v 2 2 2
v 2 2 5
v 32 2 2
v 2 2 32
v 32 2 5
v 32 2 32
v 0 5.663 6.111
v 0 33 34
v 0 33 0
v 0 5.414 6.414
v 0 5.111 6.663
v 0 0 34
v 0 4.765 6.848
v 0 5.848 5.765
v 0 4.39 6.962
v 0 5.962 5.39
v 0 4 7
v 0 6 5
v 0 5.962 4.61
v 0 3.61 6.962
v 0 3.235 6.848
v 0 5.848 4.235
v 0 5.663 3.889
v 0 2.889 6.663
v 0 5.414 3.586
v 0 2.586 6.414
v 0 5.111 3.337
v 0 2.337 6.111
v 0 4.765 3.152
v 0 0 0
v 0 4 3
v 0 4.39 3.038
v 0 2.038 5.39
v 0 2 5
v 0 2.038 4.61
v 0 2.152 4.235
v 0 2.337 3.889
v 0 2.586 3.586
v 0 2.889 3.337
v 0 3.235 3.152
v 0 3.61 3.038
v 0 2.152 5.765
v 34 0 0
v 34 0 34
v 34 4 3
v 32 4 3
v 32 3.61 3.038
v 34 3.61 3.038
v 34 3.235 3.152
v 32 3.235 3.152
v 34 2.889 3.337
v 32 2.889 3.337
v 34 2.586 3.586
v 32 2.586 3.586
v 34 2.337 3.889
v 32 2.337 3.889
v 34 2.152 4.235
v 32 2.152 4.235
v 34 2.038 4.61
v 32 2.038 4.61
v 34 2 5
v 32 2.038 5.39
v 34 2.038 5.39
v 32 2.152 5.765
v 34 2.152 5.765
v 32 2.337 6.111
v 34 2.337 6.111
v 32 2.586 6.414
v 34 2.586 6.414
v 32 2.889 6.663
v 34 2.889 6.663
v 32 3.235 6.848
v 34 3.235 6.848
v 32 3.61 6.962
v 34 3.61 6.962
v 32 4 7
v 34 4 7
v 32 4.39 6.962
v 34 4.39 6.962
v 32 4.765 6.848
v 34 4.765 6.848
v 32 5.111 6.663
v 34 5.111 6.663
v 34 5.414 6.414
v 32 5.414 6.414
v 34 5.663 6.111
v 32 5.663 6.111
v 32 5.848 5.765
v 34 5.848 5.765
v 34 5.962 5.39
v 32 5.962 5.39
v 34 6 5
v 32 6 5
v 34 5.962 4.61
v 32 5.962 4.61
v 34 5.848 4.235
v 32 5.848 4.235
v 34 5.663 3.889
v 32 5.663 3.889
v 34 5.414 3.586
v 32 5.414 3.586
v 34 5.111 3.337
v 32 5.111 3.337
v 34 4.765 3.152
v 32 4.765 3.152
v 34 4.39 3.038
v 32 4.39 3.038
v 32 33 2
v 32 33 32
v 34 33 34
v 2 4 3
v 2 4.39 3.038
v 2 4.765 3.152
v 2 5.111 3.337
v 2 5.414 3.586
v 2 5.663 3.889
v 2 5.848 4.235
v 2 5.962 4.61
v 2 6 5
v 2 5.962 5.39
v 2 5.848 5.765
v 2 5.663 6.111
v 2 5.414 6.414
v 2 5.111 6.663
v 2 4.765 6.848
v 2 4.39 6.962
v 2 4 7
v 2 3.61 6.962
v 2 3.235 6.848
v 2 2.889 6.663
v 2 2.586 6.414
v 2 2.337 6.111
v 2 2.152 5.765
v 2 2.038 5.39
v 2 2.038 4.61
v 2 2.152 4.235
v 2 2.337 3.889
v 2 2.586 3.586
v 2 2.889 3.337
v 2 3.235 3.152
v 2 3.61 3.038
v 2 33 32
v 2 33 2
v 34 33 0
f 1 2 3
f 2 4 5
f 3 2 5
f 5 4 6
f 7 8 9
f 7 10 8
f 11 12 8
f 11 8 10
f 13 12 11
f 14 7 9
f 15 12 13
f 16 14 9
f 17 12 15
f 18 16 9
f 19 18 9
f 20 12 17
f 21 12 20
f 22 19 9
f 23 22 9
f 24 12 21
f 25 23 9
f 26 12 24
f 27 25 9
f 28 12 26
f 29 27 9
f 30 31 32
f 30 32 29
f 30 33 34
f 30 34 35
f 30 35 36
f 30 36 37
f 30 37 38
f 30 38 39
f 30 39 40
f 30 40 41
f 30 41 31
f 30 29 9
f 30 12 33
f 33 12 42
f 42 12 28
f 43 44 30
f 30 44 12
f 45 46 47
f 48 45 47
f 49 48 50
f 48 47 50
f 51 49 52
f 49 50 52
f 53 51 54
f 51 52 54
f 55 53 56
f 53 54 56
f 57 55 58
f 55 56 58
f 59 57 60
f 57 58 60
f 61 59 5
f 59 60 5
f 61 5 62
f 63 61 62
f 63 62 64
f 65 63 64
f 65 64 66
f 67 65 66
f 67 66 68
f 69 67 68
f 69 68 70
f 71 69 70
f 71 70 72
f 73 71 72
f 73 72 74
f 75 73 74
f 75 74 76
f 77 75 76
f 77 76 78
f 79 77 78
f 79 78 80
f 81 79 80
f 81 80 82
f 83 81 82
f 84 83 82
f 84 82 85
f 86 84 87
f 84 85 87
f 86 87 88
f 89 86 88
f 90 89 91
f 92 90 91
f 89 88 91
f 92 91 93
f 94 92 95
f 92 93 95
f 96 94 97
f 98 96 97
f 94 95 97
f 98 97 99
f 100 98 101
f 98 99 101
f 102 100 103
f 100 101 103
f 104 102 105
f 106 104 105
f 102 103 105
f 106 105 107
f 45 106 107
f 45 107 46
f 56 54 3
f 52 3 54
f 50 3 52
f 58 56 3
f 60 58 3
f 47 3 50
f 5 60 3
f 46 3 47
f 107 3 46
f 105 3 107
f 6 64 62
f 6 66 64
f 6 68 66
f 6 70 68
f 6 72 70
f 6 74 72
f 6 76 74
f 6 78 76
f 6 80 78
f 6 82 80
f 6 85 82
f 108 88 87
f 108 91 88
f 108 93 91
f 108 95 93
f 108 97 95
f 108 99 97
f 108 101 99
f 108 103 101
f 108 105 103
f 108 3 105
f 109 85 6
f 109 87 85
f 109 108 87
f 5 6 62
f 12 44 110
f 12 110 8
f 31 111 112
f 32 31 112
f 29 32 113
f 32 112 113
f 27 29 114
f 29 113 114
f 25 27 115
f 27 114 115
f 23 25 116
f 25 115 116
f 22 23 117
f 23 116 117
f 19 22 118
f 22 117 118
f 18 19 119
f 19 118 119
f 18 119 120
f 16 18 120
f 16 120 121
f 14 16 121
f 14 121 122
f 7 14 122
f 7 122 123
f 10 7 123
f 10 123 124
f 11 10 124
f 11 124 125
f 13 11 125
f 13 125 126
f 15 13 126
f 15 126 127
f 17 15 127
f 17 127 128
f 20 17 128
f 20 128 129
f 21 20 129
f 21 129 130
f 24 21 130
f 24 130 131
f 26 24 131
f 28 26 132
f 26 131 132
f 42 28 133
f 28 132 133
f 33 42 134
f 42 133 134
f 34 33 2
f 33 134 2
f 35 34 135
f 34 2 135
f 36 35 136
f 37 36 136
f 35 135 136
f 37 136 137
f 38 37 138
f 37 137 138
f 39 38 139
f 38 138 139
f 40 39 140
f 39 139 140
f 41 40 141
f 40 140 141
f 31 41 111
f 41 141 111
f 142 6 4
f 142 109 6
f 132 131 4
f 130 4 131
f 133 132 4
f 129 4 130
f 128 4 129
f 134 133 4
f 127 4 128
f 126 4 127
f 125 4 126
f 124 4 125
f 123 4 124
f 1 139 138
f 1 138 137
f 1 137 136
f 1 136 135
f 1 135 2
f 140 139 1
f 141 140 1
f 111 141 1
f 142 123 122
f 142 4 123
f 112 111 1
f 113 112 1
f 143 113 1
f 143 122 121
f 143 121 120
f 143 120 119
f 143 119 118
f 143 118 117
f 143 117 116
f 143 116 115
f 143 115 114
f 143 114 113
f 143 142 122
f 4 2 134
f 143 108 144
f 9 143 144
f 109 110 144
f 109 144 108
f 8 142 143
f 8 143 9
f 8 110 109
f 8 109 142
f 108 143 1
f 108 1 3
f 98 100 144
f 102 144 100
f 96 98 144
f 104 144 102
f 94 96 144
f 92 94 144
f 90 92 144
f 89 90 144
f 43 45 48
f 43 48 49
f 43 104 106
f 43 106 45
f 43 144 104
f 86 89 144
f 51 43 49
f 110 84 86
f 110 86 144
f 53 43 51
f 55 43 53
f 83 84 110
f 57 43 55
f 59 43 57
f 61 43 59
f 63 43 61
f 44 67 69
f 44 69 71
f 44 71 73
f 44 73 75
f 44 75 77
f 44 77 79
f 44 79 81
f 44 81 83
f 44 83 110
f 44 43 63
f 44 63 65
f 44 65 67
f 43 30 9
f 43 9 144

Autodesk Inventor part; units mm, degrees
ref_plane "YZ Plane" through (0, 0, 0) normal (1, 0, 0) x (0, 1, 0)
ref_plane "XZ Plane" through (0, 0, 0) normal (0, 1, 0) x (-1, 0, 0)
ref_plane "XY Plane" through (0, 0, 0) normal (0, 0, 1) x (1, 0, 0)
sketch "Sketch1" plane through (0, 0, 0) normal (0, 1, 0) x (-1, 0, 0)
  line L0 (0, 0) -> (-34, 0)
  line L1 (-34, 0) -> (-34, 34)
  line L2 (-34, 34) -> (0, 34)
  line L3 (0, 34) -> (0, 0)
  dimension "d0" = 34
  dimension "d1" = 34
extrude "Extrusion1" add sketch "Sketch1" along normal blind 33
sketch "Sketch2" plane through (0, 33, 0) normal (0, 1, 0) x (1, 0, 0)
  line L0 (0, -34) -> (34, -34) projected
  line L1 (34, -34) -> (34, 0) projected
  line L2 (34, 0) -> (0, 0) projected
  line L3 (0, 0) -> (0, -34) projected
  line L4 (2, -2) -> (32, -2)
  line L5 (32, -2) -> (32, -32)
  line L6 (32, -32) -> (2, -32)
  line L7 (2, -32) -> (2, -2)
  dimension "d4" = 2
extrude "Extrusion2" cut sketch "Sketch2" against normal blind 36 contours L4 L5 L6 L7
sketch "Sketch3" plane through (34, 0, 34) normal (1, 0, 0) x (0, 0, -1)
  line L0 (0, 0) -> (34, 0) projected
  line L1 (0, 33) -> (34, 33) projected
  line L2 (2, 33) -> (32, 33) projected
  line L3 (34, 0) -> (34, 38) projected
  line L4 (34, 0) -> (29, 0)
  line L5 (0, 0) -> (34, 0) projected
  line L6 (29, 0) -> (29, 4)
  line L7 (34, 0) -> (34, 33) projected
  line L8 (0, 0) -> (0, 33) projected
  line L9 (32, 0) -> (2, 0) projected
  line L10 (32, 33) -> (32, 0) projected
  line L11 (2, 33) -> (2, 0) projected
  dimension "d7" = 5
  dimension "d8" = 4
hole "Hole1" at (34, 4, 5) direction (-1, 0, 0) diameter 4 depth 2
ref_plane "Work Plane1" through (17, 33, 32) normal (1, 0, 0) x (0, 0, -1)
mirror "Mirror1" about plane through (17, 33, 32) normal (1, 0, 0) of "Hole1"
sketch "Sketch6" plane through (0, 33, 0) normal (0, 1, 0) x (1, 0, 0)
  point P0 (0, 0)
sketch "Sketch7" plane through (0, 0, 0) normal (0, -1, 0) x (1, 0, 0)
  line L0 (34, 0) -> (0, 0) projected
  line L1 (0, 34) -> (34, 34) projected
  line L2 (34, 0) -> (0, 0)
  line L3 (0, 0) -> (0, 34)
  line L4 (0, 34) -> (34, 34)
  line L5 (34, 34) -> (34, 0)
extrude "Extrusion5" add sketch "Sketch7" against normal blind 2
equation "\"BendRadius\" = Thickness"
equation "\"BendReliefWidth\" = Thickness"
equation "\"BendReliefDepth\" = 0.5 * Thickness"
equation "\"CornerReliefSize\" = 4 * Thickness"
equation "\"MinimumRemnant\" = 2 * Thickness"
equation "\"TransitionRadius\" = BendRadius"
equation "\"JacobiRadiusSize\" = Thickness"
equation "\"GapSize\" = Thickness"
equation "\"Thickness\" = 0.5"
properties part number "waterBallonHolderv1"
